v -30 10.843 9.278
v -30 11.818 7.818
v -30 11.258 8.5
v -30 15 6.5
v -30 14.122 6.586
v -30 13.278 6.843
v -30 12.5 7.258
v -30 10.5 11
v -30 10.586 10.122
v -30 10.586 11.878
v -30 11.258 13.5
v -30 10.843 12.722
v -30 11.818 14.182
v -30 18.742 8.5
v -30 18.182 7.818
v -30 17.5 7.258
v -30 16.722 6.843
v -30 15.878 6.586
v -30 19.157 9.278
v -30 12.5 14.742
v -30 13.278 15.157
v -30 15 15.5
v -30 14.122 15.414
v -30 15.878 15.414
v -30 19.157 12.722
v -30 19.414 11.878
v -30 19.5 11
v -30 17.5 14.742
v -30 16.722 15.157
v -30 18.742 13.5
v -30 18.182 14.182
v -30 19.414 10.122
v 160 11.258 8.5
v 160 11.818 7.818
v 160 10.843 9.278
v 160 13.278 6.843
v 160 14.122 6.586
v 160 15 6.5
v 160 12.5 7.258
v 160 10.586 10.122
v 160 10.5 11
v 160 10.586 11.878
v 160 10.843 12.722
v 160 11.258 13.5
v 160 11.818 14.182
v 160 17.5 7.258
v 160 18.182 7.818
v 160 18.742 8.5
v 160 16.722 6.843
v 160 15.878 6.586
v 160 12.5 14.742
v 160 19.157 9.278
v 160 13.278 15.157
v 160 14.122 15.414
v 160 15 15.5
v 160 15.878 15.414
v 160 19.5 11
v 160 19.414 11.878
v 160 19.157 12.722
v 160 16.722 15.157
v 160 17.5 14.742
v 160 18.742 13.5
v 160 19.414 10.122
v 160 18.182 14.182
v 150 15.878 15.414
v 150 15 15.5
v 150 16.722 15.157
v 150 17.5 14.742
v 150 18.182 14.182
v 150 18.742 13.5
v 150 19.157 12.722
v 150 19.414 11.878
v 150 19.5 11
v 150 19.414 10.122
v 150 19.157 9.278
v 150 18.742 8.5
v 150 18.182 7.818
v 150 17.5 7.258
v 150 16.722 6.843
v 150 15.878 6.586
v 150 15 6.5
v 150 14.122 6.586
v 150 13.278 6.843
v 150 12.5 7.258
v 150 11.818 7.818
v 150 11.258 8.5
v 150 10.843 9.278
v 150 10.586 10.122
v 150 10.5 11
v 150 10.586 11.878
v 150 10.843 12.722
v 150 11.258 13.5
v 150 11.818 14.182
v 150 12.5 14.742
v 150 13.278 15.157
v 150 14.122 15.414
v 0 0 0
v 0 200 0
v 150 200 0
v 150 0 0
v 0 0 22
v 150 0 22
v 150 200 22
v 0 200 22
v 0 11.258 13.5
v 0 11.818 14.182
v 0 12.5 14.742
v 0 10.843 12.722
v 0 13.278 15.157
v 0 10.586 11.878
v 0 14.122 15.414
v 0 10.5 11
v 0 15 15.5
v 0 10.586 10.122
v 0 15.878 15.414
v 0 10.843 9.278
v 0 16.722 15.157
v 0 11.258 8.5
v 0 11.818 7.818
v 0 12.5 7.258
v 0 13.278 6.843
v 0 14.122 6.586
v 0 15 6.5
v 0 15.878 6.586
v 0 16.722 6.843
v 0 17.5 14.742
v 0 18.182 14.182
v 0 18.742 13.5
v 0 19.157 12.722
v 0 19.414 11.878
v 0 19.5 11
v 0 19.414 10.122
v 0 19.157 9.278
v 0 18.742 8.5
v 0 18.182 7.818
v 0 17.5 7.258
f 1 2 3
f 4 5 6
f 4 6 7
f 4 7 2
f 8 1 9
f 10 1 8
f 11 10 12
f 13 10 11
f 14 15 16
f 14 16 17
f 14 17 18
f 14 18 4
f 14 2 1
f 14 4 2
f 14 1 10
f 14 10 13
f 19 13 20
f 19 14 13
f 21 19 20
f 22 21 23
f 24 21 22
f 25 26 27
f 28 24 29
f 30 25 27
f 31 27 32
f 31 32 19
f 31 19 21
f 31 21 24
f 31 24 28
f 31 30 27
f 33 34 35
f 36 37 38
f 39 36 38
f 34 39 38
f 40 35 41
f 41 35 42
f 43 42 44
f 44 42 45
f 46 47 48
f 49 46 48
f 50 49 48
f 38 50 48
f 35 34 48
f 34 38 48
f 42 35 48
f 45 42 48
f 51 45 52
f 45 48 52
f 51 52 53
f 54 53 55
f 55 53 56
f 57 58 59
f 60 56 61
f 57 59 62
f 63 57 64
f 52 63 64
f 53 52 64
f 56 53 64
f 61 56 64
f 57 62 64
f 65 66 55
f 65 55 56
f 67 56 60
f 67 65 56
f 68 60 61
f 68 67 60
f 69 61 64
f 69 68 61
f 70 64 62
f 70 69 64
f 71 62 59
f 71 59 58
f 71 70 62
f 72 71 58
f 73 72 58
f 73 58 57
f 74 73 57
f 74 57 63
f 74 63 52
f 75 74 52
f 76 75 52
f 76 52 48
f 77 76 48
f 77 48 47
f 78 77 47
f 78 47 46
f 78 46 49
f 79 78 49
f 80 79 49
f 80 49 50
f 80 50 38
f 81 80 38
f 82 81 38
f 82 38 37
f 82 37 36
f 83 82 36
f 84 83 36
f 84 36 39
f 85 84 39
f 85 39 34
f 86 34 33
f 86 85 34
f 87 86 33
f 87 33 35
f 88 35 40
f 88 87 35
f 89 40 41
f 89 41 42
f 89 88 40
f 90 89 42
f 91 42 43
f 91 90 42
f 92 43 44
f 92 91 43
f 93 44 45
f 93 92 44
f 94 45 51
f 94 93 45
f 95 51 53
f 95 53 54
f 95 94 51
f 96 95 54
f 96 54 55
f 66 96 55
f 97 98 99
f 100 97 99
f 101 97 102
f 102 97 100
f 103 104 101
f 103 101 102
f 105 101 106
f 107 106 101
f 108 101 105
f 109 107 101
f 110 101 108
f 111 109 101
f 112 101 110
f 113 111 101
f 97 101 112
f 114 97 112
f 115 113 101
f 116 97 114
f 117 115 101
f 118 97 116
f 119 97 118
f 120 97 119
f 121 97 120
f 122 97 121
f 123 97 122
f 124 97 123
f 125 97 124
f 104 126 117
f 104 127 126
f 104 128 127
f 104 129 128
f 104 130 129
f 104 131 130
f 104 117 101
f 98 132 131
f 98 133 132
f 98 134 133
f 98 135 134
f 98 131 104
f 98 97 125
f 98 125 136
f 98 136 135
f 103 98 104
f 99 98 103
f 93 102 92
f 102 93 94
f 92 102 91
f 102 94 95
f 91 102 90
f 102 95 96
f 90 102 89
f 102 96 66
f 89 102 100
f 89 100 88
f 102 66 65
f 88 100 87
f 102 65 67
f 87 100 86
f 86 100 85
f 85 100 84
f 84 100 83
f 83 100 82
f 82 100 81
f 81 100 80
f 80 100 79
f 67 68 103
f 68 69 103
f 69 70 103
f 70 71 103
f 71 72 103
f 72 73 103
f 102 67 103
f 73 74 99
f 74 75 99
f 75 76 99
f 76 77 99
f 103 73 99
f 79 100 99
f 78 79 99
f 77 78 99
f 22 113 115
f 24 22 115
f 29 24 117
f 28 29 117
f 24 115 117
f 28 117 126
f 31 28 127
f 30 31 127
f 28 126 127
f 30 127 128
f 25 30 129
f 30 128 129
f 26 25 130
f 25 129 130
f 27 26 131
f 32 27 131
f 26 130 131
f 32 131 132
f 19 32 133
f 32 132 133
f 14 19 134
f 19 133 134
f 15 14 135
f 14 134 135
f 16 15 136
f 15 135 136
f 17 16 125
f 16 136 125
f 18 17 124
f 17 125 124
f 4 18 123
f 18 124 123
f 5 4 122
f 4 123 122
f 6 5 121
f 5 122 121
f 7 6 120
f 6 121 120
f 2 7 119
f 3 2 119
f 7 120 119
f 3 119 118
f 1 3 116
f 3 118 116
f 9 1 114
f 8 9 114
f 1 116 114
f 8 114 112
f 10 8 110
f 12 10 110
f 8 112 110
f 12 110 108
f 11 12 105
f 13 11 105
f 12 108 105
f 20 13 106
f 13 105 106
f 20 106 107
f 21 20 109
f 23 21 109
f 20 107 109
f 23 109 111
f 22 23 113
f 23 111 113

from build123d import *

# Parameters (mm, degrees)
ESQUISSE1_W           = 150
ESQUISSE1_H           = 200
EXTRUSION1_DEPTH      = 22
ESQUISSE2_R           = 4.5
EXTRUSION2_DEPTH      = 30
EXTRUSION2_DEPTH_BACK = 160


with BuildPart() as part:
    # Esquisse1 → Extrusion1 (new body)
    with BuildSketch(Plane.XY):
        with Locations((75, 100)):
            Rectangle(ESQUISSE1_W, ESQUISSE1_H)
    extrude(amount=EXTRUSION1_DEPTH)

    # Esquisse2 → Extrusion2 (add, two sides)
    with BuildSketch(Plane.ZY) as extrusion2_sk:
        with Locations((11, 15)):
            Circle(ESQUISSE2_R)
    extrude(amount=EXTRUSION2_DEPTH)
    extrude(extrusion2_sk.sketch, amount=-EXTRUSION2_DEPTH_BACK)


solid = part.part
